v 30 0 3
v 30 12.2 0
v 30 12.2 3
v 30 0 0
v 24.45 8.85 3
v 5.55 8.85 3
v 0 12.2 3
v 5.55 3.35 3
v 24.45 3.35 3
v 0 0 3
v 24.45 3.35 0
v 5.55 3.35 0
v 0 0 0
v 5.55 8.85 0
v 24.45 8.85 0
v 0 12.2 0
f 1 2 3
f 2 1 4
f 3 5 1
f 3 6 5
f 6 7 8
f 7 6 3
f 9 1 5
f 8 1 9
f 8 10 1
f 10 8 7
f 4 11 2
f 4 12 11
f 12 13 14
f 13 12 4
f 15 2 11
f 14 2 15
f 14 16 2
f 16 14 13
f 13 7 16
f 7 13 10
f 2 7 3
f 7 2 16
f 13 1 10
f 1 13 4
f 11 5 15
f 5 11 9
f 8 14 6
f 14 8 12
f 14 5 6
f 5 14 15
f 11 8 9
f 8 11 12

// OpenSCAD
difference() {
	cube([30, 12.2, 3]);
	translate([5.55, (12.2 - 5.5) / 2, 0]) {
		cube([18.9, 5.5, 3]);
	}
}
